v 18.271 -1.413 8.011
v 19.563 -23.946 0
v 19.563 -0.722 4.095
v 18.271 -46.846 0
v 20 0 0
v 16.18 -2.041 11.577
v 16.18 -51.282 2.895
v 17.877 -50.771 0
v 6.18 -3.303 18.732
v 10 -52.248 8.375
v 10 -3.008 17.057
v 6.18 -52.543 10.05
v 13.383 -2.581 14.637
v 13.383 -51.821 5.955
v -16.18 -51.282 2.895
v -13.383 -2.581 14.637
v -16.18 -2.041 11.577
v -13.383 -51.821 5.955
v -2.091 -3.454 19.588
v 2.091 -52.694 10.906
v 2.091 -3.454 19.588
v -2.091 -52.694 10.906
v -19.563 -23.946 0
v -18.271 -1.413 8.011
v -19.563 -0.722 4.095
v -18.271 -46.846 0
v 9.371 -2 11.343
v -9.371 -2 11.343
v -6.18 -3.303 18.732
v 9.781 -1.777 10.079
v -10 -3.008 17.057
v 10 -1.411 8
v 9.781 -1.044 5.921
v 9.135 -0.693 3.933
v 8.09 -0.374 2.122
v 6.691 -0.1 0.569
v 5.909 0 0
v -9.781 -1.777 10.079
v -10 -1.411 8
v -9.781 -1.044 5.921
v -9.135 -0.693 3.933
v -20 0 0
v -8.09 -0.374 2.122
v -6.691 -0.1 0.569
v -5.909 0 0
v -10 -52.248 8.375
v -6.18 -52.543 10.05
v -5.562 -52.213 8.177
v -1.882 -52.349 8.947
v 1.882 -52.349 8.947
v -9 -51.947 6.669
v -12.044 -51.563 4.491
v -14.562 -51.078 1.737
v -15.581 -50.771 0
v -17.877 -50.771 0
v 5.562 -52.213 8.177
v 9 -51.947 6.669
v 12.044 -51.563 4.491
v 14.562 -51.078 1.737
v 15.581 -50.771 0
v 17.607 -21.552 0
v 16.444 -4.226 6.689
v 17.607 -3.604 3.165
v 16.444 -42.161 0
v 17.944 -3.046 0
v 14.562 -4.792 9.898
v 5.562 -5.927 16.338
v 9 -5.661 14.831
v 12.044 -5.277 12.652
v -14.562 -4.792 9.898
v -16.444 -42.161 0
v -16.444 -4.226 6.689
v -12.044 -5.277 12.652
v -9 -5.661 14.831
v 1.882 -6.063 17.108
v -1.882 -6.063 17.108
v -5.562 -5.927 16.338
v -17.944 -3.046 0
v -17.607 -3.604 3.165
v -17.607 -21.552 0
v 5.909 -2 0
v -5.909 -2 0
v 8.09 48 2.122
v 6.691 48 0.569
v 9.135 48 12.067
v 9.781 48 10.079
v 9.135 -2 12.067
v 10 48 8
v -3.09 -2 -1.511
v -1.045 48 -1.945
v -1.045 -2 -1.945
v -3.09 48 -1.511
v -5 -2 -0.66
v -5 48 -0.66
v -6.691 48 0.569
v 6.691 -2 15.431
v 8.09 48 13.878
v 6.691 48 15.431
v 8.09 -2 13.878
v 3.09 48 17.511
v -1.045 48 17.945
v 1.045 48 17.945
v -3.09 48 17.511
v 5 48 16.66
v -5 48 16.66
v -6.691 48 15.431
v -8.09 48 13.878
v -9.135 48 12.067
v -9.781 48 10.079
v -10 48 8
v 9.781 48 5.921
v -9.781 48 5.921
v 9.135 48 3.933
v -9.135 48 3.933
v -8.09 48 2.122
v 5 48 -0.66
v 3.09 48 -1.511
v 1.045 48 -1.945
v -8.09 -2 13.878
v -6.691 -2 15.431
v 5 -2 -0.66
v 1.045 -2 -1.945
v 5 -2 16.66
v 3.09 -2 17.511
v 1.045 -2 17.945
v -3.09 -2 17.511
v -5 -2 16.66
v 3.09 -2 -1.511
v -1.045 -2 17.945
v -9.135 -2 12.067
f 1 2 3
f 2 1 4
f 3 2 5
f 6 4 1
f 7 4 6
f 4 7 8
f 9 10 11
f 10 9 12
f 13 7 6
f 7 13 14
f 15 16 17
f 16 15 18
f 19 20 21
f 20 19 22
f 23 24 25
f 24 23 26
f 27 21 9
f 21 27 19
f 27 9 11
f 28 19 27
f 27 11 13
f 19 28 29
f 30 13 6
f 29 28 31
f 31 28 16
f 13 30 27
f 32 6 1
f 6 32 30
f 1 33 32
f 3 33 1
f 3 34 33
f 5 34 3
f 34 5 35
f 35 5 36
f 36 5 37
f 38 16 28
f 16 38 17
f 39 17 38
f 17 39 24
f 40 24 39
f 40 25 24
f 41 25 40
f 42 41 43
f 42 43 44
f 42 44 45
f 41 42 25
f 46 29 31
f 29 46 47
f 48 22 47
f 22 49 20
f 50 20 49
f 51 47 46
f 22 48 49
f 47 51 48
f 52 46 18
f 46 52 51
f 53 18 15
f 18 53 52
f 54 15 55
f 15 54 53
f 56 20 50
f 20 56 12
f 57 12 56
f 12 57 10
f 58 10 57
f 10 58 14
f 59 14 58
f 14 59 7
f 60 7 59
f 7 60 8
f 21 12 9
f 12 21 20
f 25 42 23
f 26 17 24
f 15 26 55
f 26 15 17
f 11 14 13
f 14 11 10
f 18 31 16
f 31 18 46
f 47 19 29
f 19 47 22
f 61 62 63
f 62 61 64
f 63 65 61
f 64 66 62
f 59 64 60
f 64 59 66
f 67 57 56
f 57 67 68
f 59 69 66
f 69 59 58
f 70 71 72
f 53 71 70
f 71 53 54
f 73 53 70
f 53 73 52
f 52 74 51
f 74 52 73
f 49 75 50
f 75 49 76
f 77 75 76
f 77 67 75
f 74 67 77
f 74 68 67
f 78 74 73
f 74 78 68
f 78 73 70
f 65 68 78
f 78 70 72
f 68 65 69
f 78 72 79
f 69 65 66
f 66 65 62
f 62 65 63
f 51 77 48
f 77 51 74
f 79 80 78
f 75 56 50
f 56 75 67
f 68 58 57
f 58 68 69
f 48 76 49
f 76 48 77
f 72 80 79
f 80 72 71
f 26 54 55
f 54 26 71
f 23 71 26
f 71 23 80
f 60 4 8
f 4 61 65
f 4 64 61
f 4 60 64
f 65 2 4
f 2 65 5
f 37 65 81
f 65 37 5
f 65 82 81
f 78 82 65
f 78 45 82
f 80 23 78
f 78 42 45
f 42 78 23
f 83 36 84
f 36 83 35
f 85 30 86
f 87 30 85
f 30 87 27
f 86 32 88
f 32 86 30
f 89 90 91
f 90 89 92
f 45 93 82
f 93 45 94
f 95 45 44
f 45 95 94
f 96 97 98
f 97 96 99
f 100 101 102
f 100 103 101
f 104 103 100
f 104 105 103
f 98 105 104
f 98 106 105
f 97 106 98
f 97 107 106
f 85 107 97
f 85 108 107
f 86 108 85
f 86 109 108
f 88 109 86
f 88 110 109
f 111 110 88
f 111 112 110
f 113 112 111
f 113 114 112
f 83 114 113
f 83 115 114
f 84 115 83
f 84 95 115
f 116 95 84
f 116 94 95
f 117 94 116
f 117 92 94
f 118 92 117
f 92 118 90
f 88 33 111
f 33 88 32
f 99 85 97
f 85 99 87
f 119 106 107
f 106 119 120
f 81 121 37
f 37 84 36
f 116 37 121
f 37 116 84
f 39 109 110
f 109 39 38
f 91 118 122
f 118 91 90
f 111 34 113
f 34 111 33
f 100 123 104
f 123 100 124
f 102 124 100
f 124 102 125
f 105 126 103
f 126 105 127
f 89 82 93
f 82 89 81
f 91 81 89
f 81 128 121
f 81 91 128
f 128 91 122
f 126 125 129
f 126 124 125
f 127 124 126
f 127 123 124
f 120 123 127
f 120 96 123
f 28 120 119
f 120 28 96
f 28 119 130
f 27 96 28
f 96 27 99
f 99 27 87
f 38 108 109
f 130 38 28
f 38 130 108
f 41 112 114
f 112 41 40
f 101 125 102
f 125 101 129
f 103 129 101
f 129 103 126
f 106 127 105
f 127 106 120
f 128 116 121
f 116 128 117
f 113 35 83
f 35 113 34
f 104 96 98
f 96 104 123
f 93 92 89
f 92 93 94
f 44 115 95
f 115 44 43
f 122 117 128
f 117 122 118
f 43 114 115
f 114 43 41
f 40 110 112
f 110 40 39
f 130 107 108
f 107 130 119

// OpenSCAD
/*
 * Shovel (C) by Tobias Wilken
 */
 
frontRadius=20;
thickness=2;
frontLength=50;

backRadius=10;
backLength=50;

cutBottomPlate = 500;

difference() {
    rotate([100, 0, 0]) {
        difference() {
            cylinder(frontLength, r=frontRadius);
            translate([0, 0, thickness + 1]) cylinder(frontLength-thickness, r=frontRadius-thickness);
        }
    }
    translate([-cutBottomPlate / 2, -cutBottomPlate / 2, -cutBottomPlate]) cube(cutBottomPlate, cutBottomPlate, cutBottomPlate);
}

translate([0, backLength-thickness, backRadius-thickness]) rotate([90, 0, 0]) cylinder(backLength, r=backRadius);
